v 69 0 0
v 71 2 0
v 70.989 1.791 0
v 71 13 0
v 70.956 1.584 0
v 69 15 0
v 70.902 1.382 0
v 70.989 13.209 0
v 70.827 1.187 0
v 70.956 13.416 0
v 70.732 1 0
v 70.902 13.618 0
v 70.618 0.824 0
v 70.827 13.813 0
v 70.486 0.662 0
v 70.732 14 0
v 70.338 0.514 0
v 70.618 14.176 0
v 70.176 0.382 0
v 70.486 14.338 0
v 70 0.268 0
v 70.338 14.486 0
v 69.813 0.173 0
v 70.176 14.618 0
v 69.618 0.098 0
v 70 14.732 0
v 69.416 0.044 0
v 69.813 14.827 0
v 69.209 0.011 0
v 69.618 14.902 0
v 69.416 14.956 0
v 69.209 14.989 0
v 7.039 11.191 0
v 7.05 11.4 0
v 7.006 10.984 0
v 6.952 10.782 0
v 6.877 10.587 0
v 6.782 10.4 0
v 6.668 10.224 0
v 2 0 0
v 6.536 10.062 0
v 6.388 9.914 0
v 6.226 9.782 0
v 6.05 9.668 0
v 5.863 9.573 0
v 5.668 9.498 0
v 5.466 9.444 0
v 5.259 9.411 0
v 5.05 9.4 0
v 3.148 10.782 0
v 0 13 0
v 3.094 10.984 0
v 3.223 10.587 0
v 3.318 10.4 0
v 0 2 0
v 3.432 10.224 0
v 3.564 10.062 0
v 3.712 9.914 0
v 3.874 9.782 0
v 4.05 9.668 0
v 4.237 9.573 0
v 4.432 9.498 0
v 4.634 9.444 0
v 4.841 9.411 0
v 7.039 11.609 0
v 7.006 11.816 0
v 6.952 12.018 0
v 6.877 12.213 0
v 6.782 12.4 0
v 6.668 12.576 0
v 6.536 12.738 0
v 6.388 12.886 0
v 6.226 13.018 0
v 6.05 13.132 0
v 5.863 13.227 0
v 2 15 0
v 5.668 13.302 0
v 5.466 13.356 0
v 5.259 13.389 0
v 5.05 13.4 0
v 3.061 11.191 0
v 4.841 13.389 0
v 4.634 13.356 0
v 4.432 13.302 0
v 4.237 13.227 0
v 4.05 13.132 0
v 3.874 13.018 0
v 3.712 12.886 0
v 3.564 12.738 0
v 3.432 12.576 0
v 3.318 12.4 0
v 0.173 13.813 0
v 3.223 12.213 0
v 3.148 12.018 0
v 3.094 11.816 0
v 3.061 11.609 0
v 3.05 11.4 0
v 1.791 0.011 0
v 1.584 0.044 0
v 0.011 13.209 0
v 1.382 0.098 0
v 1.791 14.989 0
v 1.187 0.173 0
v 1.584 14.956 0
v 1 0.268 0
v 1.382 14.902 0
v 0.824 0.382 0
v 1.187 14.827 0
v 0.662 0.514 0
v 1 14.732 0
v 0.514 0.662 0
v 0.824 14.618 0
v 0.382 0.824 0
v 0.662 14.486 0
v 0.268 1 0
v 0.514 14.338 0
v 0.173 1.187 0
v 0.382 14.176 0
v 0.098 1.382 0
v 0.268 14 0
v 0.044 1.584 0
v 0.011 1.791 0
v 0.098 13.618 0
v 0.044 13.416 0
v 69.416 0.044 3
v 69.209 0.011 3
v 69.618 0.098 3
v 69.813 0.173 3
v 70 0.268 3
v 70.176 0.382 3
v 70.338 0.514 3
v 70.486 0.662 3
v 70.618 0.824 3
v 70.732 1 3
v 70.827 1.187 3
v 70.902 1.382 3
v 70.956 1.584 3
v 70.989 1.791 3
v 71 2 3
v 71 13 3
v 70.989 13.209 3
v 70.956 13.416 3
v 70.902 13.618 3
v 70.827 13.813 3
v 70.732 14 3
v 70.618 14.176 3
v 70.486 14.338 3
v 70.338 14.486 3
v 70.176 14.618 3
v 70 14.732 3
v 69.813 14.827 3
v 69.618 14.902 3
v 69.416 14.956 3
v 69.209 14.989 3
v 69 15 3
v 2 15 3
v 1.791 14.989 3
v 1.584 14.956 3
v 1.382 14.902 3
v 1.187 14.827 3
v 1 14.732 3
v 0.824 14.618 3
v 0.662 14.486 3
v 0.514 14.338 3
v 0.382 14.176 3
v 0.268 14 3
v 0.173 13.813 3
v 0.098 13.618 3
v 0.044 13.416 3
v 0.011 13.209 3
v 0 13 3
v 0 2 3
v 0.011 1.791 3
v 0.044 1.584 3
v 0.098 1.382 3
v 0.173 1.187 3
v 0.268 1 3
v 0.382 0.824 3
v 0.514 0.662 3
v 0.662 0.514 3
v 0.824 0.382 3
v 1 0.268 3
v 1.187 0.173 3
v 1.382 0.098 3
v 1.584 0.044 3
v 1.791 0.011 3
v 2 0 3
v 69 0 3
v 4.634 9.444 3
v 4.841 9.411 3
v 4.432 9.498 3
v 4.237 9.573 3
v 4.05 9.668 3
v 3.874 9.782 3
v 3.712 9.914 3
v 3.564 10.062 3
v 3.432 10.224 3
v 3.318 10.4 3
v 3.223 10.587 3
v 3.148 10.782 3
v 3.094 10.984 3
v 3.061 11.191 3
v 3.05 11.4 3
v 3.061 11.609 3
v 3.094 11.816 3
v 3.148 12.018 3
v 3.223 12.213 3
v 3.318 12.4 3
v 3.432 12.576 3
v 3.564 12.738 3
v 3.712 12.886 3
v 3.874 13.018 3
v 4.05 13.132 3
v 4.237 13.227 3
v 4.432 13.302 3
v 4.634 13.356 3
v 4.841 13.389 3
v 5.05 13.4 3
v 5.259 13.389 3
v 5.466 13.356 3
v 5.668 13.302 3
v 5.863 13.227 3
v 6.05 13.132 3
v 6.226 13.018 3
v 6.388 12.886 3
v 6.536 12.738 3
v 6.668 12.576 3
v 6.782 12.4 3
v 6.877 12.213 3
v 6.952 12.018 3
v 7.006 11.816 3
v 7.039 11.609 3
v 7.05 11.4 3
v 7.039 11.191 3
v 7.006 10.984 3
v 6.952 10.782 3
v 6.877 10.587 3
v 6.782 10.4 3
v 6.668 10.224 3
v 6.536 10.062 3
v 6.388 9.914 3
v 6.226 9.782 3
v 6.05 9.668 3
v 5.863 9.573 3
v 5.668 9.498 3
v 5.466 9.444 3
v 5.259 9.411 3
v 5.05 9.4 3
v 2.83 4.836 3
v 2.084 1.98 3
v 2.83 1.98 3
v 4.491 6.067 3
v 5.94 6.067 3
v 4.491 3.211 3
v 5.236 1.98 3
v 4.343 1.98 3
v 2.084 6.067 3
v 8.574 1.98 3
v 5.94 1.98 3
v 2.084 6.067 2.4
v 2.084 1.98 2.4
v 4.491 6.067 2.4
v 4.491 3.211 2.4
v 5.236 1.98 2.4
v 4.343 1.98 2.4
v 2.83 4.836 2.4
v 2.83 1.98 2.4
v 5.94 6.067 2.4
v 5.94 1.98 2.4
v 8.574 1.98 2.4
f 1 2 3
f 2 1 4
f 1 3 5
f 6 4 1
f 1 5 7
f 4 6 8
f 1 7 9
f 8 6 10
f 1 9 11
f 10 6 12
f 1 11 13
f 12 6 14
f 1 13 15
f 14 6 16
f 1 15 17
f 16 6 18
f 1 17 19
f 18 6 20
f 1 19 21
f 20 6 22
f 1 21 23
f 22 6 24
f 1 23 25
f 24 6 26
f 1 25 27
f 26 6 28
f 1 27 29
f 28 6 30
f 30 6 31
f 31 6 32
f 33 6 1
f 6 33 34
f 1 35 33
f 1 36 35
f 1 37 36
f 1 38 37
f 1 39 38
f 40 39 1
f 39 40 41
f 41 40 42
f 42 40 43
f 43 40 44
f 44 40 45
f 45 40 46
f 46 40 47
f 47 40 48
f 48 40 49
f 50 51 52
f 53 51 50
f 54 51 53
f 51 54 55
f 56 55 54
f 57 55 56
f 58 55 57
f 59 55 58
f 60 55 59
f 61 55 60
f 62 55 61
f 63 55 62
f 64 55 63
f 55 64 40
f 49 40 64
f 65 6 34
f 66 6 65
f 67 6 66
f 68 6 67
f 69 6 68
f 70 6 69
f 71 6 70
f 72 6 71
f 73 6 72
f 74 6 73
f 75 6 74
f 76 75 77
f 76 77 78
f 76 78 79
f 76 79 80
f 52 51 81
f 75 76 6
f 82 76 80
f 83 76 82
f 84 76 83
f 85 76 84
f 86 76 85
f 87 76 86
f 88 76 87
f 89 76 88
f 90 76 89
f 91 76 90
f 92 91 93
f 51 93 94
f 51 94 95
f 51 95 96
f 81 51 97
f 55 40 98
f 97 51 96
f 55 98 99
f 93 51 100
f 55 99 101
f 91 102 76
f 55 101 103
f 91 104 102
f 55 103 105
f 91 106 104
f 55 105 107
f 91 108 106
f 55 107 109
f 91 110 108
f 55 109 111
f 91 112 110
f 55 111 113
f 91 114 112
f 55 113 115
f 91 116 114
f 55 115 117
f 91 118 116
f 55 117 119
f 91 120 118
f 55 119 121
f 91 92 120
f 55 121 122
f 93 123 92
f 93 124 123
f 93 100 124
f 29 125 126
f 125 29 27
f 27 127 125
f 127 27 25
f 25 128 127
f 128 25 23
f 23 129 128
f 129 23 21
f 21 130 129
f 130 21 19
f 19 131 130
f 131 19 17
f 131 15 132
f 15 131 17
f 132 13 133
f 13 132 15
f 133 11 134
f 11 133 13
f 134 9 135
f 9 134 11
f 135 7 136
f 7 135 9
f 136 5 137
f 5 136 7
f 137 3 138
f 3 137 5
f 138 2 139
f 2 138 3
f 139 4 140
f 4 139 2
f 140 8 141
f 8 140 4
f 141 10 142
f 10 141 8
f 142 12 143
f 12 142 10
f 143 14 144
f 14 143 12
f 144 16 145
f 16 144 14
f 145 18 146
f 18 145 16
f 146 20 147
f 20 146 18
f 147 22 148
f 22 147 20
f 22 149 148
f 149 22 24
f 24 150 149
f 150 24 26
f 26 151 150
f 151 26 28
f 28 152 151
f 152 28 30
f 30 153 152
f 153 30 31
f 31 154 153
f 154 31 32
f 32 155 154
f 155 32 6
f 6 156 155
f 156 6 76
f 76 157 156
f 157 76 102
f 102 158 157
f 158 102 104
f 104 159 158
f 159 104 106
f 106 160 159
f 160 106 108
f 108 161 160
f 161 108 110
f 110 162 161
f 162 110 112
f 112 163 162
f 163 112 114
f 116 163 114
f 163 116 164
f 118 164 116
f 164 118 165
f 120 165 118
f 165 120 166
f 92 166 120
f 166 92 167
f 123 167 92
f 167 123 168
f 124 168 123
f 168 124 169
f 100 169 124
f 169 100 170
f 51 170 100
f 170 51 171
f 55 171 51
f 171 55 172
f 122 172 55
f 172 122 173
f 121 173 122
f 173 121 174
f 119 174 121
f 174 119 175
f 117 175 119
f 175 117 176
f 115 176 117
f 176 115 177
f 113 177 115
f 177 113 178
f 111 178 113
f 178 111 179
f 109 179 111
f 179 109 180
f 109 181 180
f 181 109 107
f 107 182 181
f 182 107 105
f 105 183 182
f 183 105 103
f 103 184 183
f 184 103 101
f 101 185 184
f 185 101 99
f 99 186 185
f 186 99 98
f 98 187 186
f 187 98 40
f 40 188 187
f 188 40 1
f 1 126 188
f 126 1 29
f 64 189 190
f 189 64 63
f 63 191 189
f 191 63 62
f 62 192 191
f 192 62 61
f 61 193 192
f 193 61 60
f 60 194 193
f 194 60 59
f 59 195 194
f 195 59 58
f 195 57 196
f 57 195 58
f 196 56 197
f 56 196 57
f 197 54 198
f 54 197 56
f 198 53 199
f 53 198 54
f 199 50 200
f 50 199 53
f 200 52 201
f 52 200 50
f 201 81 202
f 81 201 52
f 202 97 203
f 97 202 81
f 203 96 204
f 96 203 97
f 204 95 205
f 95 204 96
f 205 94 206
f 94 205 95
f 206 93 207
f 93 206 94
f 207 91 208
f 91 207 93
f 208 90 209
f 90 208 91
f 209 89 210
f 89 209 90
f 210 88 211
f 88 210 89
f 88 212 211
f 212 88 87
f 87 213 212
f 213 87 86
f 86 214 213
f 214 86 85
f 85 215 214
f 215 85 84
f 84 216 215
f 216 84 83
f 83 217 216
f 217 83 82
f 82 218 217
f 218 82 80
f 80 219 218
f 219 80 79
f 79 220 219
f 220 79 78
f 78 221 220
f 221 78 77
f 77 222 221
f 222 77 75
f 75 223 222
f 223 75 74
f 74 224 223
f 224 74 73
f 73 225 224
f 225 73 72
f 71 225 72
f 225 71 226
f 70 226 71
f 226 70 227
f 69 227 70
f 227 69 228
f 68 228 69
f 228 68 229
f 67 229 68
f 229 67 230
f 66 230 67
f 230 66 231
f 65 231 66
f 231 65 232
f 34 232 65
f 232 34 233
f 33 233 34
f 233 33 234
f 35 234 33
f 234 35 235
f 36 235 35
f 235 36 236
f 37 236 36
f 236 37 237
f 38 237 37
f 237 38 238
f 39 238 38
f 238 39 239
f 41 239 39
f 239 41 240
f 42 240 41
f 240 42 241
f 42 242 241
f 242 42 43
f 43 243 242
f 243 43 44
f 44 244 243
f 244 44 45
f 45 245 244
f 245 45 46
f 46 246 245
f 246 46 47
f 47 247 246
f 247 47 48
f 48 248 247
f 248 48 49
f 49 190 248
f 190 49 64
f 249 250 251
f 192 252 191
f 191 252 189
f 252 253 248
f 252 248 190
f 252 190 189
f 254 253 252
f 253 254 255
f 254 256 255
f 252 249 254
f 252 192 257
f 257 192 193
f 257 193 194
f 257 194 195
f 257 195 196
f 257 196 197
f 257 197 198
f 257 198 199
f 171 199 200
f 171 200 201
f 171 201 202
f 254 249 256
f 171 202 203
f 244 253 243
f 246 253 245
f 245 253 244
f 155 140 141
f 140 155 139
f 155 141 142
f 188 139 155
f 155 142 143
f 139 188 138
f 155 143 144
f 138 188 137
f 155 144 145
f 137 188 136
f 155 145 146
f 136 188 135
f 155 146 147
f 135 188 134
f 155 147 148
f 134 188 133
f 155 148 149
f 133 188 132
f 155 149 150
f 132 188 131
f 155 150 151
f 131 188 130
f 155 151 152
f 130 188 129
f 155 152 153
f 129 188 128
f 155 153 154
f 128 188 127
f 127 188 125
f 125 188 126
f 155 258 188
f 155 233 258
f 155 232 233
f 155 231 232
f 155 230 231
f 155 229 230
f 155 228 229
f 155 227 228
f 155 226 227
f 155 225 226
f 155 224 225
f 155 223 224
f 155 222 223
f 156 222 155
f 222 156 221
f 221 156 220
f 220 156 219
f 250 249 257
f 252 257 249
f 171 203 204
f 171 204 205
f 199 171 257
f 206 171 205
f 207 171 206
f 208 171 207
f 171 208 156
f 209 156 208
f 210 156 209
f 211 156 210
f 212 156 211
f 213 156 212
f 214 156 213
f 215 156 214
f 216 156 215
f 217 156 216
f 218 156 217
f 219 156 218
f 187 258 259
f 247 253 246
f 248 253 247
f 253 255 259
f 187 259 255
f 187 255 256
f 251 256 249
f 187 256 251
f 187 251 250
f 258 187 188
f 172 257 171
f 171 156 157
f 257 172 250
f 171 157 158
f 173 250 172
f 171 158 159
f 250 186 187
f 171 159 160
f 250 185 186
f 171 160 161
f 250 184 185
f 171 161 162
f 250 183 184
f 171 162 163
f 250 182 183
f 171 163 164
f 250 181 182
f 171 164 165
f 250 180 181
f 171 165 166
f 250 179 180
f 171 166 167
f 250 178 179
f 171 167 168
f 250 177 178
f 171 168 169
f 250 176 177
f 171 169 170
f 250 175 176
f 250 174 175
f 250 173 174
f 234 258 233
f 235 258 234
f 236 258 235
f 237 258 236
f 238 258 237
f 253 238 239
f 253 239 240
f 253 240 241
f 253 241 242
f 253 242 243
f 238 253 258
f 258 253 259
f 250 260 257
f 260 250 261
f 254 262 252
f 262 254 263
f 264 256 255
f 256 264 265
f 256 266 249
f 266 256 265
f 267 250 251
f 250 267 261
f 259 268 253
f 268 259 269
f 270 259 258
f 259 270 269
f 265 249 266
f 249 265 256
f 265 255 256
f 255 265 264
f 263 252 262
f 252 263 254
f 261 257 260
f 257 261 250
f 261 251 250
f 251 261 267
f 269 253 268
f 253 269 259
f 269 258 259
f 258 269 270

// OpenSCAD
// =============================================================================
// Nederlands Kenteken Sleutelhanger / Dutch License Plate Keychain
// =============================================================================
// MakerWorld Parametric Model Maker compatible OpenSCAD model.
// Geoptimaliseerd voor FDM 3D-printers (Bambu Lab AMS / multi-color):
// - Zwarte drager met zwarte buitenrand alléén rondom de hele plaat.
// - Blauw Europees vlak links waarvan de linkerhoeken meebuigen met de afgeronde buitenrand.
// - Sleutelgat op de plek van de EU-sterrencirkel (bovenin het blauwe vlak),
//   omringd door een witte ring.
// - Witte 'NL' landcode onder het sleutelgat in het blauwe vlak.
// - Zwart ingelegde kentekentekst in het gele vlak (met authentiek Nederlands kentekenfont).
// - Volledig vlakke toplaag (flush / erin) – perfect voor Textured PEI prints!

/* [Model Type / Stijl] */
// Kies tussen verzonken (vlak / inlay - beste hechting en toplaag) of reliëf (gelaagd - minder filamentwissels)
stijl = "inlay"; // [inlay:Vlakke Inlay (Flush - 100% slijtvast en strak), relief:Reliëf (Gelaagd - Letters liggen bovenop)]

/* [Onderdeel Selectie] */
// Welk onderdeel weergeven/exporteren ("all" voor het complete model)
part = "all"; // [all:Alles (Preview), black:Alleen Zwart (Basis en letters), yellow:Alleen Geel (Nummerplaat), blue:Alleen Blauw (EU vlak), white:Alleen Wit (NL code)]

/* [Kenteken Instellingen] */
// Het gewenste kenteken (bijv. 12-AB-34, 1-ABC-23, AA-12-BB)
kenteken_tekst = "G-363-GZ";

// Lettertype voor kenteken ("Kenteken" is het officiële Nederlandse kentekenfont)
lettertype = "Kenteken"; // font

// Landcode onder het sleutelgat (standaard NL)
landcode = "NL";

// Lettergrootte van de landcode (NL) in mm
landcode_grootte = 3.8; // [2.0:0.2:5.0]

// Extra lijndikte / bold-effect voor de landcode (NL) in mm
landcode_extra_dikte = 0.12; // [0.0:0.02:0.3]

// Hoogte/grootte van de kentekentekst in mm
tekst_grootte = 7.8; // [6.0:0.2:10.0]

// Extra lijndikte / bold-effect voor de kentekentekst in mm
tekst_extra_dikte = 0.20; // [0.0:0.05:0.5]

/* [Afmetingen] */
// Totale lengte van de nummerplaat in mm
plaat_lengte = 71; // [50:1:110]

// Totale hoogte van de nummerplaat in mm
plaat_hoogte = 15; // [12:1:30]

// Totale dikte van de sleutelhanger in mm
totale_dikte = 3.0; // [2.0:0.2:5.0]

// Breedte van de zwarte buitenrand in mm
rand_breedte = 0.9; // [0.6:0.1:2.0]

// Hoekradius van de plaat in mm
hoek_radius = 2.0; // [1.0:0.5:4.0]

// Binnendiameter van het sleutelring-gat in mm
gat_diameter = 4.0; // [3.0:0.5:5.0]

// Breedte van de witte ring rondom het sleutelgat in mm (0 = geen ring, blauw loopt massief door tot aan het gat)
witte_ring_dikte = 0.0; // [0.0:0.1:1.5]

// Breedte van het blauwe EU-vlak in mm
eu_breedte = 9.2; // [7.0:0.2:15.0]

// Diepte van het gele en blauwe basisvlak in mm (bij reliëf stijl)
vlak_dikte = 0.6; // [0.4:0.2:1.2]

// Dikte van de bovenop liggende letters, witte NL en buitenrand in mm (bij reliëf stijl) of inlegdiepte (bij inlay stijl)
opdruk_dikte = 0.6; // [0.4:0.2:1.0]

/* [Kleuren (Bambu Lab AMS / Multi-Color)] */
// Kleur van de zwarte houder, buitenrand en letters (Zwart)
kleur_zwart = "#111111"; // color

// Kleur van de kentekenplaat (Nederlands geel)
kleur_geel = "#FFCC00"; // color

// Kleur van het Europese vlak (EU blauw)
kleur_blauw = "#003399"; // color

// Kleur van de witte ring en NL landcode (Wit)
kleur_wit = "#FFFFFF"; // color

/* [Verborgen Parameters] */
/* [Hidden] */
$fn = 60;

// Positie van het sleutelgat: exact op de plek van de EU-sterrencirkel (bovenaan in het blauwe vlak)
gat_x = rand_breedte + (eu_breedte - rand_breedte) / 2;
gat_y = plaat_hoogte - rand_breedte - witte_ring_dikte - gat_diameter / 2 - 0.7;

// 2D buitencontour van de hele plaat
module plate_contour_2d() {
    hull() {
        translate([hoek_radius, hoek_radius]) circle(r=hoek_radius);
        translate([plaat_lengte - hoek_radius, hoek_radius]) circle(r=hoek_radius);
        translate([plaat_lengte - hoek_radius, plaat_hoogte - hoek_radius]) circle(r=hoek_radius);
        translate([hoek_radius, plaat_hoogte - hoek_radius]) circle(r=hoek_radius);
    }
}

// 2D binnenoppervlak (binnen de zwarte buitenrand)
module inner_plate_2d() {
    offset(r=-rand_breedte)
        plate_contour_2d();
}

// 2D blauw EU-vlak (buigt links mee met de afgeronde buitenrand)
module eu_field_2d() {
    intersection() {
        inner_plate_2d();
        square([eu_breedte, plaat_hoogte]);
    }
}

// 2D witte ring rondom het sleutelgat
module white_ring_2d() {
    difference() {
        translate([gat_x, gat_y])
            circle(d=gat_diameter + 2 * witte_ring_dikte);
        translate([gat_x, gat_y])
            circle(d=gat_diameter);
    }
}

// 2D witte landcode tekst (NL) onder het sleutelgat (instelbare grootte & dikte via Customizer)
module eu_country_text_2d() {
    let(
        y_pos = rand_breedte + 1.2
    ) {
        translate([gat_x, y_pos]) {
            if (landcode_extra_dikte > 0) {
                offset(delta=landcode_extra_dikte)
                    text(
                        landcode, 
                        size=landcode_grootte, 
                        font=lettertype, 
                        halign="center", 
                        valign="baseline"
                    );
            } else {
                text(
                    landcode, 
                    size=landcode_grootte, 
                    font=lettertype, 
                    halign="center", 
                    valign="baseline"
                );
            }
        }
    }
}

// 2D zwarte letters en cijfers van het kenteken (gecentreerd en met instelbare grootte & lijndikte)
module plate_text_2d() {
    let(
        yellow_min_x = eu_breedte,
        yellow_max_x = plaat_lengte - rand_breedte,
        center_x = (yellow_min_x + yellow_max_x) / 2,
        center_y = plaat_hoogte / 2
    ) {
        translate([center_x, center_y]) {
            if (tekst_extra_dikte > 0) {
                offset(delta=tekst_extra_dikte)
                    text(
                        text=kenteken_tekst, 
                        size=tekst_grootte, 
                        font=lettertype, 
                        halign="center", 
                        valign="center"
                    );
            } else {
                text(
                    text=kenteken_tekst, 
                    size=tekst_grootte, 
                    font=lettertype, 
                    halign="center", 
                    valign="center"
                );
            }
        }
    }
}

// =============================================================================
// 3D Modules (Ondersteunt zowel "inlay" als "relief")
// =============================================================================

// Laagberekening voor "relief"
z_relief_bodem = totale_dikte - vlak_dikte - opdruk_dikte;
z_relief_vlak  = totale_dikte - opdruk_dikte;

// Laagberekening voor "inlay"
z_inlay_bodem = totale_dikte - opdruk_dikte;

// 1. Zwart
module BlackParts() {
    color(kleur_zwart) {
        if (stijl == "inlay") {
            // Vlakke inlay: Volledige massieve bodem tot z_inlay_bodem
            linear_extrude(height=z_inlay_bodem)
                difference() {
                    plate_contour_2d();
                    translate([gat_x, gat_y]) circle(d=gat_diameter);
                }
            // Zwarte buitenrand + verzonken kentekentekst op z_inlay_bodem tot totale_dikte
            translate([0, 0, z_inlay_bodem])
                linear_extrude(height=opdruk_dikte) {
                    difference() {
                        plate_contour_2d();
                        inner_plate_2d();
                    }
                    plate_text_2d();
                }
        } else {
            // Reliëf stijl:
            // 1. Massieve achterkant/drager (Z: 0 tot z_relief_bodem)
            linear_extrude(height=z_relief_bodem)
                difference() {
                    plate_contour_2d();
                    translate([gat_x, gat_y]) circle(d=gat_diameter);
                }
            // 2. Doorlopende zwarte buitenrand in de tussenzone (Z: z_relief_bodem tot z_relief_vlak)
            translate([0, 0, z_relief_bodem])
                linear_extrude(height=vlak_dikte)
                    difference() {
                        plate_contour_2d();
                        inner_plate_2d();
                    }
            // 3. Bovenste laag (Z: z_relief_vlak tot totale_dikte): Buitenrand + reliëf letters
            translate([0, 0, z_relief_vlak])
                linear_extrude(height=opdruk_dikte) {
                    difference() {
                        plate_contour_2d();
                        inner_plate_2d();
                    }
                    plate_text_2d();
                }
        }
    }
}

// 2. Geel
module YellowPart() {
    color(kleur_geel) {
        if (stijl == "inlay") {
            // Vlakke inlay: Geel vlak met uitsparingen voor zwarte letters
            translate([0, 0, z_inlay_bodem])
                linear_extrude(height=opdruk_dikte)
                    difference() {
                        inner_plate_2d();
                        eu_field_2d();
                        plate_text_2d();
                    }
        } else {
            // Reliëf stijl: Massief geel vlak onder de letters door (Z: z_relief_bodem tot z_relief_vlak)
            translate([0, 0, z_relief_bodem])
                linear_extrude(height=vlak_dikte)
                    difference() {
                        inner_plate_2d();
                        eu_field_2d();
                    }
        }
    }
}

// 3. Blauw
module BluePart() {
    color(kleur_blauw) {
        if (stijl == "inlay") {
            // Vlakke inlay: Blauw vlak met uitsparingen voor gat en witte NL tekst
            translate([0, 0, z_inlay_bodem])
                linear_extrude(height=opdruk_dikte)
                    difference() {
                        eu_field_2d();
                        translate([gat_x, gat_y])
                            circle(d=gat_diameter + (witte_ring_dikte > 0 ? 2 * witte_ring_dikte : 0));
                        eu_country_text_2d();
                    }
        } else {
            // Reliëf stijl: Massief blauw vlak onder de witte tekst door (Z: z_relief_bodem tot z_relief_vlak)
            translate([0, 0, z_relief_bodem])
                linear_extrude(height=vlak_dikte)
                    difference() {
                        eu_field_2d();
                        translate([gat_x, gat_y])
                            circle(d=gat_diameter + (witte_ring_dikte > 0 ? 2 * witte_ring_dikte : 0));
                    }
        }
    }
}

// 4. Wit
module WhiteParts() {
    color(kleur_wit) {
        if (stijl == "inlay") {
            // Vlakke inlay: Witte NL landcode op gelijke hoogte (Z: z_inlay_bodem tot totale_dikte)
            translate([0, 0, z_inlay_bodem])
                linear_extrude(height=opdruk_dikte) {
                    if (witte_ring_dikte > 0) {
                        white_ring_2d();
                    }
                    eu_country_text_2d();
                }
        } else {
            // Reliëf stijl: Witte NL landcode bovenop het blauwe vlak (Z: z_relief_vlak tot totale_dikte)
            translate([0, 0, z_relief_vlak])
                linear_extrude(height=opdruk_dikte) {
                    if (witte_ring_dikte > 0) {
                        white_ring_2d();
                    }
                    eu_country_text_2d();
                }
        }
    }
}

// =============================================================================
// Samenstelling op basis van part parameter
// =============================================================================
if (part == "all") {
    BlackParts();
    YellowPart();
    BluePart();
    WhiteParts();
} else if (part == "black") {
    BlackParts();
} else if (part == "yellow") {
    YellowPart();
} else if (part == "blue") {
    BluePart();
} else if (part == "white") {
    WhiteParts();
}
